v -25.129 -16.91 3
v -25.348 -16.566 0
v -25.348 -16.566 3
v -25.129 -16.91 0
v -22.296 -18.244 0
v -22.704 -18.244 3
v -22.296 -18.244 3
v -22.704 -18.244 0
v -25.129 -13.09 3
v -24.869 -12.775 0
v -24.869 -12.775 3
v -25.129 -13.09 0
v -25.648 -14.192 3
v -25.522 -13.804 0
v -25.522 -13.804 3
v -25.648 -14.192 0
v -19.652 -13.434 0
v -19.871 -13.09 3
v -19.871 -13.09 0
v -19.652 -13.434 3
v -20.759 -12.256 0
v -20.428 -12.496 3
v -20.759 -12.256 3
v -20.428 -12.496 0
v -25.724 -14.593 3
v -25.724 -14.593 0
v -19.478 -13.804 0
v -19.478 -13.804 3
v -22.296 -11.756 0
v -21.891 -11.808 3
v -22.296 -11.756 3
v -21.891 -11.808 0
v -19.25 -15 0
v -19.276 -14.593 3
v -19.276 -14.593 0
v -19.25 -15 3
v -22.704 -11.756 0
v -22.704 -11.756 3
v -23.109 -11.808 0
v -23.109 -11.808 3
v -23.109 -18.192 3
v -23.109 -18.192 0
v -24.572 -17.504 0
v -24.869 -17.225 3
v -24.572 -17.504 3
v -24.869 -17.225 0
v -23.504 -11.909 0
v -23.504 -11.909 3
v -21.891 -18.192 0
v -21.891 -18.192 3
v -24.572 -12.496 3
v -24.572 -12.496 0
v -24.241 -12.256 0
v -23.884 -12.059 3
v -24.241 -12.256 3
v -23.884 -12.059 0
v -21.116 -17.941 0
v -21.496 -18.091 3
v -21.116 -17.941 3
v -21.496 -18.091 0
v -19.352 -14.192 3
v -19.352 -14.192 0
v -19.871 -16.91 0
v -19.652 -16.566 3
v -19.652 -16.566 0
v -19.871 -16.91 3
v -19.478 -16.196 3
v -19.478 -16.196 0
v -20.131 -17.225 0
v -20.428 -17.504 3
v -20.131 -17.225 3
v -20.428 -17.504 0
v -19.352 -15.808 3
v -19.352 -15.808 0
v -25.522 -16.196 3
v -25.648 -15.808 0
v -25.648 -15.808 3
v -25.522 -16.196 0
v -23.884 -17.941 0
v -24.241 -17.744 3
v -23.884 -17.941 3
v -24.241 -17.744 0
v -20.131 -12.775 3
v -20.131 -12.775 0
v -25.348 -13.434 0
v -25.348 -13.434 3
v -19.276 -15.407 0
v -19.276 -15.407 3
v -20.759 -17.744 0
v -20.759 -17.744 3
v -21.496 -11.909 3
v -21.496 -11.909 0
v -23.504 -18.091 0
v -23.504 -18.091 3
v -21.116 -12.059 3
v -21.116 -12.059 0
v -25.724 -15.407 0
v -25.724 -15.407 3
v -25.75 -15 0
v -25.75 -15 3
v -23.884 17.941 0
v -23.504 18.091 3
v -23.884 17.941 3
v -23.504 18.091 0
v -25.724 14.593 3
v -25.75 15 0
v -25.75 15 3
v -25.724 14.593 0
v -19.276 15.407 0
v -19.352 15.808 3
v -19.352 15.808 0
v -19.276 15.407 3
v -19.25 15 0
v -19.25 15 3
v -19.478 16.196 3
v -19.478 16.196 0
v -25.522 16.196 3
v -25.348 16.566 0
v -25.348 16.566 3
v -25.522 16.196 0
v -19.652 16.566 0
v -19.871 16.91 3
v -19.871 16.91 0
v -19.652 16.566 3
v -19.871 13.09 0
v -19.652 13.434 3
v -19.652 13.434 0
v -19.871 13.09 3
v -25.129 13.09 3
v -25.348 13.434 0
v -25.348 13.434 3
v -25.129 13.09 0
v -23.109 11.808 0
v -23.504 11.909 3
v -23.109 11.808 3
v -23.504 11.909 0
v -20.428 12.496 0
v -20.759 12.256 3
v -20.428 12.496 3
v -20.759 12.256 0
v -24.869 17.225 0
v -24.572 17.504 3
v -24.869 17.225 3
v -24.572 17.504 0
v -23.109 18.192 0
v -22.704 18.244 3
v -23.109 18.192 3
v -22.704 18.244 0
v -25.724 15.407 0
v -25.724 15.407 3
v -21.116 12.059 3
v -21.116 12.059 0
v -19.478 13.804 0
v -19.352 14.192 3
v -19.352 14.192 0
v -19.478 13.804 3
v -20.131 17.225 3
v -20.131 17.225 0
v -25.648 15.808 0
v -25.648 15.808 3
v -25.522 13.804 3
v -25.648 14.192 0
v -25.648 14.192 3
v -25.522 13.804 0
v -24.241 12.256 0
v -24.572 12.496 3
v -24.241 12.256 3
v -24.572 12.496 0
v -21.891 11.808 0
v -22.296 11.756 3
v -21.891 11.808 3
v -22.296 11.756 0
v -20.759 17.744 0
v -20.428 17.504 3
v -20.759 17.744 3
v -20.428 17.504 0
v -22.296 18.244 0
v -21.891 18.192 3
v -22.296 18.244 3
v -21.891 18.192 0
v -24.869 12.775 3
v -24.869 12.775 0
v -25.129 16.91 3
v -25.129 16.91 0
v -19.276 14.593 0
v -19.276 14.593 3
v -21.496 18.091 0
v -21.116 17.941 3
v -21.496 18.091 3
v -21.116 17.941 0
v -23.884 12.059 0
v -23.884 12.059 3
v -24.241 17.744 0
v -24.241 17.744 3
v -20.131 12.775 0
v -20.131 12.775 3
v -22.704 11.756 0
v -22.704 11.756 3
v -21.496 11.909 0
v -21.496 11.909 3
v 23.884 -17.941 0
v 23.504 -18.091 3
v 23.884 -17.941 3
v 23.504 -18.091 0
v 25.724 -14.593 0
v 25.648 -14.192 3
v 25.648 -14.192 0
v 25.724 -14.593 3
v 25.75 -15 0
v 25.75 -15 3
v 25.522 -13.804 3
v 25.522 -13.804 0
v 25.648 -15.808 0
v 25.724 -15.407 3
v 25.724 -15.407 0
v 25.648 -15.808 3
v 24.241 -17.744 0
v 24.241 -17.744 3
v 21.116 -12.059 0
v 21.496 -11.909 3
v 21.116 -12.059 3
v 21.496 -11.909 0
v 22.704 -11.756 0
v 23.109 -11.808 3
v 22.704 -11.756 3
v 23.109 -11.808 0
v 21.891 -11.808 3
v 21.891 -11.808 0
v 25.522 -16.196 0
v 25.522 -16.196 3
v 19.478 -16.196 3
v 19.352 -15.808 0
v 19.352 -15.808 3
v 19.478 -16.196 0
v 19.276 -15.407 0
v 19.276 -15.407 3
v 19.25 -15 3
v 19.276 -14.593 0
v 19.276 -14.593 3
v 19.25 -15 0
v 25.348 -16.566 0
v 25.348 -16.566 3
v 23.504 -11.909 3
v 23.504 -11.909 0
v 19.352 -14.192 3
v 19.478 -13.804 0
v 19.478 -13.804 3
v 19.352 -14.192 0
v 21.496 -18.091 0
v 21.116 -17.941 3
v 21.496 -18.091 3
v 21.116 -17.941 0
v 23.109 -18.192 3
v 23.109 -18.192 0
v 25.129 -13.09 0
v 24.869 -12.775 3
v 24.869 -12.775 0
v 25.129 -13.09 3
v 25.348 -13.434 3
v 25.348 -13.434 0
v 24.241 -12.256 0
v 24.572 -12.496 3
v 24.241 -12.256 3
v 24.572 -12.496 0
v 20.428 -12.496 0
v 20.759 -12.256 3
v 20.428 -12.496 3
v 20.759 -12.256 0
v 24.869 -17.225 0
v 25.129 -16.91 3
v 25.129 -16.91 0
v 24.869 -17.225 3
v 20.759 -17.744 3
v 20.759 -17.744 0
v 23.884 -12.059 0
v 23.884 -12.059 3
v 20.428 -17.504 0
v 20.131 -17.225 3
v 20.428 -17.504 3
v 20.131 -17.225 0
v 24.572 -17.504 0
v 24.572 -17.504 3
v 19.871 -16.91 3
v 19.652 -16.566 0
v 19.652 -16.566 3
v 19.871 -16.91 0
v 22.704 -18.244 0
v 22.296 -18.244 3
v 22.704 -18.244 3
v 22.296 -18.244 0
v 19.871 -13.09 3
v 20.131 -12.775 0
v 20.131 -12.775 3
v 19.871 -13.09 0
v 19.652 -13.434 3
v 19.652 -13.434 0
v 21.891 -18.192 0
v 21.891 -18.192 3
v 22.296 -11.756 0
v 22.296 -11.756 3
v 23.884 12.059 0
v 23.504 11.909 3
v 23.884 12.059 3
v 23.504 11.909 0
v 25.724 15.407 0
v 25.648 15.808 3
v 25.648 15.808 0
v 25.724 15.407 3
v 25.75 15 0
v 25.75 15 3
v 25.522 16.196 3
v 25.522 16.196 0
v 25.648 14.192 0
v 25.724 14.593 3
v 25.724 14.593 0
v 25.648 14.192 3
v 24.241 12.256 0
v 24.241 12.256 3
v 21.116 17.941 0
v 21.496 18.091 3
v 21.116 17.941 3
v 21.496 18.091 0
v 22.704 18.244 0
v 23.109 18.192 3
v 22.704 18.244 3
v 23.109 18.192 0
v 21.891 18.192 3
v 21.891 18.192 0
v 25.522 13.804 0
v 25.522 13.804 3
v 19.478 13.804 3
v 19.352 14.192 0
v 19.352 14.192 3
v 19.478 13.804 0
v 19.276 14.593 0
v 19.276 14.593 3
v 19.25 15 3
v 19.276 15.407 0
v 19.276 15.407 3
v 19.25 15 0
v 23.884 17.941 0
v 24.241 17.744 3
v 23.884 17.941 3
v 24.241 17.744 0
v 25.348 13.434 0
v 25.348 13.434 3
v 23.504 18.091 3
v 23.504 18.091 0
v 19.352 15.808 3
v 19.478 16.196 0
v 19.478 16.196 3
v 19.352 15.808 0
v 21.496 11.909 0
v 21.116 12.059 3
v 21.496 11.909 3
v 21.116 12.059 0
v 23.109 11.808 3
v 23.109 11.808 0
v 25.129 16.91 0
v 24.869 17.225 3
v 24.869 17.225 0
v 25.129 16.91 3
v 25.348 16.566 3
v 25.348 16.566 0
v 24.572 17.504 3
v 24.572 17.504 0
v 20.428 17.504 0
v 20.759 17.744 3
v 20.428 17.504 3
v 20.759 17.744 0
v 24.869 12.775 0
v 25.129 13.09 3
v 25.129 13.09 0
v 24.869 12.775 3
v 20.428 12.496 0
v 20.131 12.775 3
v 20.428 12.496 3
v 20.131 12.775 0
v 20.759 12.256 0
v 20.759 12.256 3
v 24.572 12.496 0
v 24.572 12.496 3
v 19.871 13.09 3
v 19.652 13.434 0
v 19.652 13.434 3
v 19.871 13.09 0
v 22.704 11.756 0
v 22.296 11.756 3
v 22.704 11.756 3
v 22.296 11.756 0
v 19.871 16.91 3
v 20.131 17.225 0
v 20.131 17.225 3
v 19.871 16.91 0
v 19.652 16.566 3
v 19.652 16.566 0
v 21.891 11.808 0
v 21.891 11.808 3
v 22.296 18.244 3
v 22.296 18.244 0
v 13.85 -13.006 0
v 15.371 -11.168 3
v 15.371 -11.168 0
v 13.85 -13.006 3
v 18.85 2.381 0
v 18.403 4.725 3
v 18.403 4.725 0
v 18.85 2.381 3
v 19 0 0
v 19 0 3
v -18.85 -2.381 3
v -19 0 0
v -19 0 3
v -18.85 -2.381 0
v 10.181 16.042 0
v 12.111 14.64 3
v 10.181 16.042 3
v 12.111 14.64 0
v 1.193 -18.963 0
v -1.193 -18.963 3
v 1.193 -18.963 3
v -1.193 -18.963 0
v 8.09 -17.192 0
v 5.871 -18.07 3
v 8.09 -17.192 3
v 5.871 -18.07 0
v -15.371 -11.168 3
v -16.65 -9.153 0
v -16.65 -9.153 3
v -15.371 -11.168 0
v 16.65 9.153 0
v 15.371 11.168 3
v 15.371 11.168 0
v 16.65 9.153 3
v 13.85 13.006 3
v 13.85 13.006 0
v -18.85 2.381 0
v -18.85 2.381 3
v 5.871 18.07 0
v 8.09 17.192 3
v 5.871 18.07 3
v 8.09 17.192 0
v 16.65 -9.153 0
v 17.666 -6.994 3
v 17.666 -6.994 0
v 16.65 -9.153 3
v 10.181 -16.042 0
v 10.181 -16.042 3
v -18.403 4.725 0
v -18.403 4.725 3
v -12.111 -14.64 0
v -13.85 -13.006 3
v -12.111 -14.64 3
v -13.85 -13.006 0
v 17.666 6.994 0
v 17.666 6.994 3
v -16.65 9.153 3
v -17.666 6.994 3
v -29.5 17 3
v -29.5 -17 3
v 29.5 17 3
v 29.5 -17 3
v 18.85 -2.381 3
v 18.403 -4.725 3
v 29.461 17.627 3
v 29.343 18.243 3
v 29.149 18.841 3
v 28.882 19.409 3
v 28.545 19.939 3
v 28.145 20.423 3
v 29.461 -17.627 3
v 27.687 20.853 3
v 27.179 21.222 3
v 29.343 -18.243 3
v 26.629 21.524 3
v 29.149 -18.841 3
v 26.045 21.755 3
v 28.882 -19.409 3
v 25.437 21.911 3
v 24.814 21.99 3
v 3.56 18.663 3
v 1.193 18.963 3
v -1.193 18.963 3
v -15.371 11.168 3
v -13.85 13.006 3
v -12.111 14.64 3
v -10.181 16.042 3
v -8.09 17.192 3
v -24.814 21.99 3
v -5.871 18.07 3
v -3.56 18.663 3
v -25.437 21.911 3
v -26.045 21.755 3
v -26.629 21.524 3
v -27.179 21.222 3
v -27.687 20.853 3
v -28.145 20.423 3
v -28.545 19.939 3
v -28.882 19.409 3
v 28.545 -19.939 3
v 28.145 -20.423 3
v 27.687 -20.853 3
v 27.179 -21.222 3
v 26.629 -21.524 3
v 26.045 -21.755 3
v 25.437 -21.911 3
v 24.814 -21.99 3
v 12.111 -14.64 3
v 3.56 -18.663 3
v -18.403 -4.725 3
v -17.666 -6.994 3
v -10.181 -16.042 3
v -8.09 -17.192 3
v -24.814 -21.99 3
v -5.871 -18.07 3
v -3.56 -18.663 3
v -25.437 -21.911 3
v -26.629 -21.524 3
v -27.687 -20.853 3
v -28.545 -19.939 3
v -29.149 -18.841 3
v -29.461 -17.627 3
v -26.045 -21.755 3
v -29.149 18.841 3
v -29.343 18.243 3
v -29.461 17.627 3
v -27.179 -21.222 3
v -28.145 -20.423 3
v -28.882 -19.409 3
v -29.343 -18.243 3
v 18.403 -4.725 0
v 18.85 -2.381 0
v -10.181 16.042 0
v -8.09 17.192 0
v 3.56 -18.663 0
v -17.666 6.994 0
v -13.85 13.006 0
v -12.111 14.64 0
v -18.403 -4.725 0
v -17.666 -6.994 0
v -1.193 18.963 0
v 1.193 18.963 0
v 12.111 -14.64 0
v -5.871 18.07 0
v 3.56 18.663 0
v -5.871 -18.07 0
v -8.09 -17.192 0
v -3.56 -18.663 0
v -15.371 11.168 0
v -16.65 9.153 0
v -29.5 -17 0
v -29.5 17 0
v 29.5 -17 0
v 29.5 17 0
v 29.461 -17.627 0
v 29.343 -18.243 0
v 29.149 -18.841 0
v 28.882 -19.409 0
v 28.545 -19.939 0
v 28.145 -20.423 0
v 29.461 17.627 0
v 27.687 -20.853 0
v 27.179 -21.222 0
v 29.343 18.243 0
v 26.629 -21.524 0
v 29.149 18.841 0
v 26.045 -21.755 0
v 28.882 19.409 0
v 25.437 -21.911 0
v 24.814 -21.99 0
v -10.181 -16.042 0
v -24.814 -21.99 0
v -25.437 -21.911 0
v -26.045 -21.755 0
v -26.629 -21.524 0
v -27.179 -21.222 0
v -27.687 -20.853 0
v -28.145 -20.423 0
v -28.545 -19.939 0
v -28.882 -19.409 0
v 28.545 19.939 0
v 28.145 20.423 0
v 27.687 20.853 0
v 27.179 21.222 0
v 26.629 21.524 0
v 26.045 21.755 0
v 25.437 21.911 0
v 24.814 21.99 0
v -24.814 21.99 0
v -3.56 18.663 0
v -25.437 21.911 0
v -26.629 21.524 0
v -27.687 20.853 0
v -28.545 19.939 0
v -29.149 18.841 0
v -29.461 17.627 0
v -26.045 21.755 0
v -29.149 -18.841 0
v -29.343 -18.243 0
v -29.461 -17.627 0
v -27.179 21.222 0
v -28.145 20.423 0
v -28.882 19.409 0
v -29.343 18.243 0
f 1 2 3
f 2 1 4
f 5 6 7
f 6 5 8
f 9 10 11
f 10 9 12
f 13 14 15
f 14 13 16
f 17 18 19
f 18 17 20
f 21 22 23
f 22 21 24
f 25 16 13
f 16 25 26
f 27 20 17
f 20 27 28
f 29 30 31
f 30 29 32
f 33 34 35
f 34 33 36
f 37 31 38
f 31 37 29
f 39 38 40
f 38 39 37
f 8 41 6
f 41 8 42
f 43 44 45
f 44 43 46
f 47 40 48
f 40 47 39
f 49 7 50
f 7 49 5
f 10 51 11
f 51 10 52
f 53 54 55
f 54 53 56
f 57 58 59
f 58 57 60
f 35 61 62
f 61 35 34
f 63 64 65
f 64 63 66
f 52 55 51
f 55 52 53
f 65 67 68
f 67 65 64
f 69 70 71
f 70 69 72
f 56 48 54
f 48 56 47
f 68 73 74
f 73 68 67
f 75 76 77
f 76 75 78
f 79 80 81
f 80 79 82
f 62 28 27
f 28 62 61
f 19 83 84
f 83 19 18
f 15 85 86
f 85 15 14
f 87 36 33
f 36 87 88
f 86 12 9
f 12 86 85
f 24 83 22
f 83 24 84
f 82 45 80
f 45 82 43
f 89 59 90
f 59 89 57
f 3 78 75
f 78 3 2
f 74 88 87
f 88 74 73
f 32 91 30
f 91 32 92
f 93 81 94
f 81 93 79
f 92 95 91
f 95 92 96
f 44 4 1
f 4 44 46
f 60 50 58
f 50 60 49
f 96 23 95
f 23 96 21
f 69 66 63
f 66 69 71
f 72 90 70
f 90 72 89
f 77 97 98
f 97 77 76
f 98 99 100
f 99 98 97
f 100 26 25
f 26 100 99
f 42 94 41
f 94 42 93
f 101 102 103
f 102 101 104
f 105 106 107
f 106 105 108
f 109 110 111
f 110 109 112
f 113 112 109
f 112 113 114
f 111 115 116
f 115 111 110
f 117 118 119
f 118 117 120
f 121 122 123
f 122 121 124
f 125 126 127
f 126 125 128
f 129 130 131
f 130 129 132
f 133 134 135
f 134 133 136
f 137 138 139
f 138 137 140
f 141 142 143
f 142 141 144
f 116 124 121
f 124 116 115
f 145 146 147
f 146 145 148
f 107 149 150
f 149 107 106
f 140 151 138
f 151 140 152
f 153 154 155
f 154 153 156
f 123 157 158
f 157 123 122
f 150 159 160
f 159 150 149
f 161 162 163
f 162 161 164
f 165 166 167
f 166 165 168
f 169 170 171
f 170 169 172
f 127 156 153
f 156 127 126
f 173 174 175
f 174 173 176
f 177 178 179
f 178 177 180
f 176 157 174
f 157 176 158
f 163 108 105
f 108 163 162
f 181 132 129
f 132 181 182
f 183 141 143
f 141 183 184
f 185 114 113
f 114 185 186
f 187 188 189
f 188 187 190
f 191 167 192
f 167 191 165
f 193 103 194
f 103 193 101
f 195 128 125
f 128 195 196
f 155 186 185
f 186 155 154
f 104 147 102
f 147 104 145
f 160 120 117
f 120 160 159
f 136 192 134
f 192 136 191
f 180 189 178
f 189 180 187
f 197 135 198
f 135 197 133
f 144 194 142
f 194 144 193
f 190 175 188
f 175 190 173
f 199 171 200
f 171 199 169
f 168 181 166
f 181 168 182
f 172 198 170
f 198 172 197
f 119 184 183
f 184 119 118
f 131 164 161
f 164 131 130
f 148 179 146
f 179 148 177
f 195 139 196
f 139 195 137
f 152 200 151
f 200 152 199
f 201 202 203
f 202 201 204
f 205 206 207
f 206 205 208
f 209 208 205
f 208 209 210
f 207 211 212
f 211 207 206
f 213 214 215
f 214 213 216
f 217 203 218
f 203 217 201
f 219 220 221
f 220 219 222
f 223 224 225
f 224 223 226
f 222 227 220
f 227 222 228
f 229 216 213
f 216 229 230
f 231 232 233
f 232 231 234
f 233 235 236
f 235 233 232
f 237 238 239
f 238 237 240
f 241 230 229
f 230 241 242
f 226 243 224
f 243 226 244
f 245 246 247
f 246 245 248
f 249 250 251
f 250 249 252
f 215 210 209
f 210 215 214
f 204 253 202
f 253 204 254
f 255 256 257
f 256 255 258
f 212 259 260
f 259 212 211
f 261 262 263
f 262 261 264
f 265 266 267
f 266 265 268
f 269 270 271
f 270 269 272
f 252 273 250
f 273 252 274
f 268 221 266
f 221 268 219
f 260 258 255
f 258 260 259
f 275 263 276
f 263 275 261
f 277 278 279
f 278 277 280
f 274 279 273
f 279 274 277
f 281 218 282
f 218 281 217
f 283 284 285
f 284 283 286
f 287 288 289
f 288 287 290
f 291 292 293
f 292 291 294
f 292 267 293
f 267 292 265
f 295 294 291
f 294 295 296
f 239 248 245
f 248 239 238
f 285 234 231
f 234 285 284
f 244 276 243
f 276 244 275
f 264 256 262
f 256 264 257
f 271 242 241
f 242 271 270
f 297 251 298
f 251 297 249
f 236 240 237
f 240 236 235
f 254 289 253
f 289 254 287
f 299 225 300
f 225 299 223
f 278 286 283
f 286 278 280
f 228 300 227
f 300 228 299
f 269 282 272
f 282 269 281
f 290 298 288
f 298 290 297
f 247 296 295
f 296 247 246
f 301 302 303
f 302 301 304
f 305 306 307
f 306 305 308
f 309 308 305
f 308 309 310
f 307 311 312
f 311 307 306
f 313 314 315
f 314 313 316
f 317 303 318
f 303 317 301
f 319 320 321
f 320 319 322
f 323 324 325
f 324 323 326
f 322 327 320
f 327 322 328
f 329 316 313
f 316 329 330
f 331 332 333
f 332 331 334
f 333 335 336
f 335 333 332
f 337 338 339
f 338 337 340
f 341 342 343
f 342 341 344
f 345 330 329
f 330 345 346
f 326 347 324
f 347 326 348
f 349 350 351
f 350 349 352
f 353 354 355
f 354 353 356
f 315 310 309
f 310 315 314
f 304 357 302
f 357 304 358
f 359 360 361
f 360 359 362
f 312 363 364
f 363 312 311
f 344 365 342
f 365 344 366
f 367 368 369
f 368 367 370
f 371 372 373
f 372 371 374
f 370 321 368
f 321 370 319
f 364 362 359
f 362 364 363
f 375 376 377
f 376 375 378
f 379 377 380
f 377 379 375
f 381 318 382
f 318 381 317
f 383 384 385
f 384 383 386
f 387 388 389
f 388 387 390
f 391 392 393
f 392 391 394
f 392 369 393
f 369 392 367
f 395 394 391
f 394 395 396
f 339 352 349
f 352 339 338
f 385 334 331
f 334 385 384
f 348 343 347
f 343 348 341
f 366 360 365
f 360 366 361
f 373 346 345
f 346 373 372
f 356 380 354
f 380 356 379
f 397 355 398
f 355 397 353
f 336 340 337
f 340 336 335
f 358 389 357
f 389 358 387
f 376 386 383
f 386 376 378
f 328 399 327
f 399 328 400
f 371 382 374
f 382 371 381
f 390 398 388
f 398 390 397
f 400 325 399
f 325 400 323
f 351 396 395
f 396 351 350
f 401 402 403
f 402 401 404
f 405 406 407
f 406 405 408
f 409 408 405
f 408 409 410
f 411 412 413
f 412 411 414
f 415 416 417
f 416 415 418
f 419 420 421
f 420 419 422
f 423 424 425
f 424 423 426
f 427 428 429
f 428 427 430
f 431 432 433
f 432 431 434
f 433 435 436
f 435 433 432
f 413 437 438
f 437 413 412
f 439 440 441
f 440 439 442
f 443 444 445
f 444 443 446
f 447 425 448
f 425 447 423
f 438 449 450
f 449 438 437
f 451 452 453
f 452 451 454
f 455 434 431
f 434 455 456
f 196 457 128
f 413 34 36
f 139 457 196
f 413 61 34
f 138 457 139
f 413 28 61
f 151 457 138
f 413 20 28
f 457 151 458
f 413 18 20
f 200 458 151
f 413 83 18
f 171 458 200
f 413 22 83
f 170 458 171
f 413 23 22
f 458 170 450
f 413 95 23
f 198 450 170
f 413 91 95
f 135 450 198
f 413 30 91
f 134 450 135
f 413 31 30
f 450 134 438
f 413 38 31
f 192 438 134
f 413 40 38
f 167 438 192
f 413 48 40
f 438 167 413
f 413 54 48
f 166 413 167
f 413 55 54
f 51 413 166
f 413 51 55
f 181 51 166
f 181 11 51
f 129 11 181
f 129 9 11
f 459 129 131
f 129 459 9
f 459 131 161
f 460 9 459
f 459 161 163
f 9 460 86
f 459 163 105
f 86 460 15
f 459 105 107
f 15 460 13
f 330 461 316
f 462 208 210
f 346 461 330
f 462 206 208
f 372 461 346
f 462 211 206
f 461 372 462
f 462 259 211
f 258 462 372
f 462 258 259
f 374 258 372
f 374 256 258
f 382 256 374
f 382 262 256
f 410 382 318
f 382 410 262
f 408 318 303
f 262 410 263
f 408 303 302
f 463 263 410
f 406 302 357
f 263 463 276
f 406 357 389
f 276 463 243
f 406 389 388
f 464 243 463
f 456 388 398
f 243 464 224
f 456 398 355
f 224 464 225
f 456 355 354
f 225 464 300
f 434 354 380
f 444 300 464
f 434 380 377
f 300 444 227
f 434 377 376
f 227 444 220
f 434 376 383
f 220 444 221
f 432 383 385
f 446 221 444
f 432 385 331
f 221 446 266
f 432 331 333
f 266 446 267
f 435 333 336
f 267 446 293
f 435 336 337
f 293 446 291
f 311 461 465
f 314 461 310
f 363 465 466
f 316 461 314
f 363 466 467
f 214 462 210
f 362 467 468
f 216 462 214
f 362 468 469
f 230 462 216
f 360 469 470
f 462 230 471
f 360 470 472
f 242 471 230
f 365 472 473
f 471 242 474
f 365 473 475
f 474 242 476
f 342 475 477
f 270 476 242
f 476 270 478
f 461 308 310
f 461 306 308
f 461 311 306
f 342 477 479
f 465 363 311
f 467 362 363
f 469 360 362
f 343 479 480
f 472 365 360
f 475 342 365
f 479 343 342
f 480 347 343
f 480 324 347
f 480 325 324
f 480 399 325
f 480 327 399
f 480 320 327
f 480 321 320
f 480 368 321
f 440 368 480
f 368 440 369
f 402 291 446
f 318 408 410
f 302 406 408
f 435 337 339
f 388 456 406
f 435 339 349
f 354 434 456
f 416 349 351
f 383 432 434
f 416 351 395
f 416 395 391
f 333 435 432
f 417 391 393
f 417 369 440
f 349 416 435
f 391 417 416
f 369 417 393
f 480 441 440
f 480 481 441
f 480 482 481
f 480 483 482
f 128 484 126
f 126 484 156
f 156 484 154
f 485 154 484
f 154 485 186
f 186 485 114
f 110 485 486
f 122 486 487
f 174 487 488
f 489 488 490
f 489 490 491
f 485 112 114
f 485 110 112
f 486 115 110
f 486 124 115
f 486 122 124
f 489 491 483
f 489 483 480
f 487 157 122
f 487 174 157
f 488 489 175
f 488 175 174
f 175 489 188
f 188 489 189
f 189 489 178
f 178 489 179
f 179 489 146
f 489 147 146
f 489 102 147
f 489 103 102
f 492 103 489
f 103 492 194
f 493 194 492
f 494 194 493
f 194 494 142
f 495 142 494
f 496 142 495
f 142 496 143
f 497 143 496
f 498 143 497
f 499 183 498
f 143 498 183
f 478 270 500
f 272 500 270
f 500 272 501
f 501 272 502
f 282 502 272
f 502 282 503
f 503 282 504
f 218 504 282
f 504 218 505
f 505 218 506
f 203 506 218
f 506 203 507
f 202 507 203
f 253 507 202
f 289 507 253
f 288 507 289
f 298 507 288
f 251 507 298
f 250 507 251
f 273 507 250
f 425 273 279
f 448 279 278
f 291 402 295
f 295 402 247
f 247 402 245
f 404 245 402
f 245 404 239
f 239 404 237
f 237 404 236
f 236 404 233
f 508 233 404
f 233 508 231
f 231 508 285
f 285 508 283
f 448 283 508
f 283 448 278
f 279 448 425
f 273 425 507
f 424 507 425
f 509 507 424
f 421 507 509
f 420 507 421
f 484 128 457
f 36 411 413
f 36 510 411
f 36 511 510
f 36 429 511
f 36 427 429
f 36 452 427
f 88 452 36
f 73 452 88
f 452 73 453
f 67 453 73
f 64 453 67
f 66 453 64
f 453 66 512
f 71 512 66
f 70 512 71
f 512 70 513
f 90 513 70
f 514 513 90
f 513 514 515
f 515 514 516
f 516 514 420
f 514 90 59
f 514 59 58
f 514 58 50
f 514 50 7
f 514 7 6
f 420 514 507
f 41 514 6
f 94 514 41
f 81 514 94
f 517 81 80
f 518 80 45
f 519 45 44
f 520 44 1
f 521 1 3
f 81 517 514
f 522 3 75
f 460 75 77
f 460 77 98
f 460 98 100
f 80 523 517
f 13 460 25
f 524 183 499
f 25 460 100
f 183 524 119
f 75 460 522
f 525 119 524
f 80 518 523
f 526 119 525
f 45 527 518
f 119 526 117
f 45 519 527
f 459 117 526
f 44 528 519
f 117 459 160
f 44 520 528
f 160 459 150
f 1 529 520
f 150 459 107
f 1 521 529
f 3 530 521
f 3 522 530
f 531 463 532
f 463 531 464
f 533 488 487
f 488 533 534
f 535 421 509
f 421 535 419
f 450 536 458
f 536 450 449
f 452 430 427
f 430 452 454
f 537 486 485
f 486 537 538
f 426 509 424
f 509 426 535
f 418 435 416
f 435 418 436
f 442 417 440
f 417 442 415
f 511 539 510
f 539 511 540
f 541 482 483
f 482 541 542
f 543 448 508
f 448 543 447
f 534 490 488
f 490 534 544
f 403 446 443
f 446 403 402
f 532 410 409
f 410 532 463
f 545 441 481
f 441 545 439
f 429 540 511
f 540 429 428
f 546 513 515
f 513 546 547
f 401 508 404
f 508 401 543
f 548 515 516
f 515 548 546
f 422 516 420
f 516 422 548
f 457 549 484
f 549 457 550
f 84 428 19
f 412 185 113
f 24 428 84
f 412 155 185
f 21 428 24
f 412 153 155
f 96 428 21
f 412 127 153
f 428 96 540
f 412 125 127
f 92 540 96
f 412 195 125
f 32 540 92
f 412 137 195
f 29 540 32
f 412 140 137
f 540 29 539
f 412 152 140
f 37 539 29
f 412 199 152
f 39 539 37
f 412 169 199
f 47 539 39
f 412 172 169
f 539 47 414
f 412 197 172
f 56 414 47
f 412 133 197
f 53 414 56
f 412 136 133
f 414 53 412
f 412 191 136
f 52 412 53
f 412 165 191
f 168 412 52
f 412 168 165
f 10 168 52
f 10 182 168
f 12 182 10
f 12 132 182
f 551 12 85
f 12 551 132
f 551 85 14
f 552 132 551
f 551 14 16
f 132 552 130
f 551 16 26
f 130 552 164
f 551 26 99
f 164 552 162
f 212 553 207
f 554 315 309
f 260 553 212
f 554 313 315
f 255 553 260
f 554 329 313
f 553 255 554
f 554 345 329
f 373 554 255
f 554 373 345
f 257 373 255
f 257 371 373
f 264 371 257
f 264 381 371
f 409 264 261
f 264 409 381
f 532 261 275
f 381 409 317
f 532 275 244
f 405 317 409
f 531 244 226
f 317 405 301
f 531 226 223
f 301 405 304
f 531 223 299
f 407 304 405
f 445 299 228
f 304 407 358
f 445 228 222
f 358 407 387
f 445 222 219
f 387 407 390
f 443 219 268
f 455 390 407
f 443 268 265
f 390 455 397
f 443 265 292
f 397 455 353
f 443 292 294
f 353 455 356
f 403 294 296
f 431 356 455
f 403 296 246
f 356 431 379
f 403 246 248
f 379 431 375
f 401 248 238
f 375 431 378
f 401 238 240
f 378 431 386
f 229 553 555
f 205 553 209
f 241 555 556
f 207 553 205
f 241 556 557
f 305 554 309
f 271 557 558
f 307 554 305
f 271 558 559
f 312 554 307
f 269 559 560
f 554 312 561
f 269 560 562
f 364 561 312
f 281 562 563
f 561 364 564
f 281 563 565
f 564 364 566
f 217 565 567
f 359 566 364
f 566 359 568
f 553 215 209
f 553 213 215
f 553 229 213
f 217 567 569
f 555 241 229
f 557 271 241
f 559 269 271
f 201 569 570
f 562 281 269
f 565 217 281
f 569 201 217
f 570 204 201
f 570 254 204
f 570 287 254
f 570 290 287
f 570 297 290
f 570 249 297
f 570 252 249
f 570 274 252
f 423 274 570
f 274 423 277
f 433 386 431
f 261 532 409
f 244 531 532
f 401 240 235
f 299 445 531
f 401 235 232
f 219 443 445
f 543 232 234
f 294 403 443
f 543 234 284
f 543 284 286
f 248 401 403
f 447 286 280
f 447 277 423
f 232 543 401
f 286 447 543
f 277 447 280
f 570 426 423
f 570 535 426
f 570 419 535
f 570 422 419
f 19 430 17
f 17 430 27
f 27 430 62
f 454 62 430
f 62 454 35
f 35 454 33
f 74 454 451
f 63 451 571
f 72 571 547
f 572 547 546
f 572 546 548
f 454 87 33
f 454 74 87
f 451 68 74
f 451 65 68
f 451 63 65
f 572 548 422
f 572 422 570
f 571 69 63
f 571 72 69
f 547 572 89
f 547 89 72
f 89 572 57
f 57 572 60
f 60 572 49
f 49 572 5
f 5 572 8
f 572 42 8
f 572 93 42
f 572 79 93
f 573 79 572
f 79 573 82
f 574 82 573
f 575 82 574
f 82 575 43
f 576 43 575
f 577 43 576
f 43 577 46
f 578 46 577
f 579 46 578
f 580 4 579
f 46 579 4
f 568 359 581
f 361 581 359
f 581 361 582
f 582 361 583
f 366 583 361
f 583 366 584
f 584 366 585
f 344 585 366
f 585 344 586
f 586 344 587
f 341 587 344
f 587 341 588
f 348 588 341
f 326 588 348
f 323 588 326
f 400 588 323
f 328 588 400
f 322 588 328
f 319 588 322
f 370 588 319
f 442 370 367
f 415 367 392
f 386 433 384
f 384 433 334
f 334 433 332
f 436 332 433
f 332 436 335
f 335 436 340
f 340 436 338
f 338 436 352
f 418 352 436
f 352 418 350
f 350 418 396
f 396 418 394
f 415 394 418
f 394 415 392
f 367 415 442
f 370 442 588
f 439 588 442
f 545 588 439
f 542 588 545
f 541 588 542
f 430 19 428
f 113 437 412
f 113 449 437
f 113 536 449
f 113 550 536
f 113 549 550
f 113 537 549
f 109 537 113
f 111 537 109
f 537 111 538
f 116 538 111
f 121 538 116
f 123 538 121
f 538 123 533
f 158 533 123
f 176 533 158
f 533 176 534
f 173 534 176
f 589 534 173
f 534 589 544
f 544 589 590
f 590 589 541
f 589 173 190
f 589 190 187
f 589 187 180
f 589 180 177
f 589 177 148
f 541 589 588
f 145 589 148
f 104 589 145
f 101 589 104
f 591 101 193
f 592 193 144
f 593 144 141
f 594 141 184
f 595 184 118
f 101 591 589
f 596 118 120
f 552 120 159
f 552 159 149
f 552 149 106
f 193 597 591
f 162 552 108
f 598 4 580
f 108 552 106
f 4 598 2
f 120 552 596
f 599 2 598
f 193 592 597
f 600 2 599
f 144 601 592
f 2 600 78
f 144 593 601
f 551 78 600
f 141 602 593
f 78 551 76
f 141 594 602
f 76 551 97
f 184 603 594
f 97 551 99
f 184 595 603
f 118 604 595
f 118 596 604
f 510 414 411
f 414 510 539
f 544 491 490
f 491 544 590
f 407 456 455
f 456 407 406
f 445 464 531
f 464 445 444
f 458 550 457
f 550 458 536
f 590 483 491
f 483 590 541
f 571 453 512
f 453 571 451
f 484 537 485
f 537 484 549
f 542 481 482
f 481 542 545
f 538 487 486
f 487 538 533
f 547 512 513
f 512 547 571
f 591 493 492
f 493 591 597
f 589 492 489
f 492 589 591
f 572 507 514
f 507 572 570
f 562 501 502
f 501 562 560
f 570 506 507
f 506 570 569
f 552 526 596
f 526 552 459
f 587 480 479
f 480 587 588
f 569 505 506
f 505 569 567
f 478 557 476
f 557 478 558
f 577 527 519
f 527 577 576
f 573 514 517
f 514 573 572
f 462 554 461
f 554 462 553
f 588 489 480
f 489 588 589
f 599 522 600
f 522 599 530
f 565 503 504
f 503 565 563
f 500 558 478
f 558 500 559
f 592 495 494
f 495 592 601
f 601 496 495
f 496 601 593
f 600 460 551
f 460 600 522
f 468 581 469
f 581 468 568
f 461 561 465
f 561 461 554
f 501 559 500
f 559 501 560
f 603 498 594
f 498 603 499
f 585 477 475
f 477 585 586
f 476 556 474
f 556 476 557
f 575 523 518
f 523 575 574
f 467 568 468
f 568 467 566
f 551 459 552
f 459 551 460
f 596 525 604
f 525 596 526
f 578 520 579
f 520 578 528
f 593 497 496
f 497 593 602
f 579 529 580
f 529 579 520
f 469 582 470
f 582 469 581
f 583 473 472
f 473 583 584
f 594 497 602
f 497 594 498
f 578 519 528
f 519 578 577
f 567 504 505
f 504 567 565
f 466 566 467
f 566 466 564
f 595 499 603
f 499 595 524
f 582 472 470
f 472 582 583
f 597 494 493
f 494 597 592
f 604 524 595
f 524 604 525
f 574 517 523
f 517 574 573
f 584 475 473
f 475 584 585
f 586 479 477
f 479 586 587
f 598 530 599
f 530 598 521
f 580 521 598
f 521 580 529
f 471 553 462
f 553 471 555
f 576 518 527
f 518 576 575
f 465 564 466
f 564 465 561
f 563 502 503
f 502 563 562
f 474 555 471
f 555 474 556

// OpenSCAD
$fn = 50;


difference() {
	union() {
		hull() {
			translate(v = [-24.5000000000, 17.0000000000, 0]) {
				cylinder(h = 3, r = 5);
			}
			translate(v = [24.5000000000, 17.0000000000, 0]) {
				cylinder(h = 3, r = 5);
			}
			translate(v = [-24.5000000000, -17.0000000000, 0]) {
				cylinder(h = 3, r = 5);
			}
			translate(v = [24.5000000000, -17.0000000000, 0]) {
				cylinder(h = 3, r = 5);
			}
		}
	}
	union() {
		#translate(v = [-22.5000000000, -15.0000000000, -100.0000000000]) {
			cylinder(h = 200, r = 3.2500000000);
		}
		#translate(v = [-22.5000000000, 15.0000000000, -100.0000000000]) {
			cylinder(h = 200, r = 3.2500000000);
		}
		#translate(v = [22.5000000000, -15.0000000000, -100.0000000000]) {
			cylinder(h = 200, r = 3.2500000000);
		}
		#translate(v = [22.5000000000, 15.0000000000, -100.0000000000]) {
			cylinder(h = 200, r = 3.2500000000);
		}
		#cylinder(h = 3, r = 19.0000000000);
	}
}
